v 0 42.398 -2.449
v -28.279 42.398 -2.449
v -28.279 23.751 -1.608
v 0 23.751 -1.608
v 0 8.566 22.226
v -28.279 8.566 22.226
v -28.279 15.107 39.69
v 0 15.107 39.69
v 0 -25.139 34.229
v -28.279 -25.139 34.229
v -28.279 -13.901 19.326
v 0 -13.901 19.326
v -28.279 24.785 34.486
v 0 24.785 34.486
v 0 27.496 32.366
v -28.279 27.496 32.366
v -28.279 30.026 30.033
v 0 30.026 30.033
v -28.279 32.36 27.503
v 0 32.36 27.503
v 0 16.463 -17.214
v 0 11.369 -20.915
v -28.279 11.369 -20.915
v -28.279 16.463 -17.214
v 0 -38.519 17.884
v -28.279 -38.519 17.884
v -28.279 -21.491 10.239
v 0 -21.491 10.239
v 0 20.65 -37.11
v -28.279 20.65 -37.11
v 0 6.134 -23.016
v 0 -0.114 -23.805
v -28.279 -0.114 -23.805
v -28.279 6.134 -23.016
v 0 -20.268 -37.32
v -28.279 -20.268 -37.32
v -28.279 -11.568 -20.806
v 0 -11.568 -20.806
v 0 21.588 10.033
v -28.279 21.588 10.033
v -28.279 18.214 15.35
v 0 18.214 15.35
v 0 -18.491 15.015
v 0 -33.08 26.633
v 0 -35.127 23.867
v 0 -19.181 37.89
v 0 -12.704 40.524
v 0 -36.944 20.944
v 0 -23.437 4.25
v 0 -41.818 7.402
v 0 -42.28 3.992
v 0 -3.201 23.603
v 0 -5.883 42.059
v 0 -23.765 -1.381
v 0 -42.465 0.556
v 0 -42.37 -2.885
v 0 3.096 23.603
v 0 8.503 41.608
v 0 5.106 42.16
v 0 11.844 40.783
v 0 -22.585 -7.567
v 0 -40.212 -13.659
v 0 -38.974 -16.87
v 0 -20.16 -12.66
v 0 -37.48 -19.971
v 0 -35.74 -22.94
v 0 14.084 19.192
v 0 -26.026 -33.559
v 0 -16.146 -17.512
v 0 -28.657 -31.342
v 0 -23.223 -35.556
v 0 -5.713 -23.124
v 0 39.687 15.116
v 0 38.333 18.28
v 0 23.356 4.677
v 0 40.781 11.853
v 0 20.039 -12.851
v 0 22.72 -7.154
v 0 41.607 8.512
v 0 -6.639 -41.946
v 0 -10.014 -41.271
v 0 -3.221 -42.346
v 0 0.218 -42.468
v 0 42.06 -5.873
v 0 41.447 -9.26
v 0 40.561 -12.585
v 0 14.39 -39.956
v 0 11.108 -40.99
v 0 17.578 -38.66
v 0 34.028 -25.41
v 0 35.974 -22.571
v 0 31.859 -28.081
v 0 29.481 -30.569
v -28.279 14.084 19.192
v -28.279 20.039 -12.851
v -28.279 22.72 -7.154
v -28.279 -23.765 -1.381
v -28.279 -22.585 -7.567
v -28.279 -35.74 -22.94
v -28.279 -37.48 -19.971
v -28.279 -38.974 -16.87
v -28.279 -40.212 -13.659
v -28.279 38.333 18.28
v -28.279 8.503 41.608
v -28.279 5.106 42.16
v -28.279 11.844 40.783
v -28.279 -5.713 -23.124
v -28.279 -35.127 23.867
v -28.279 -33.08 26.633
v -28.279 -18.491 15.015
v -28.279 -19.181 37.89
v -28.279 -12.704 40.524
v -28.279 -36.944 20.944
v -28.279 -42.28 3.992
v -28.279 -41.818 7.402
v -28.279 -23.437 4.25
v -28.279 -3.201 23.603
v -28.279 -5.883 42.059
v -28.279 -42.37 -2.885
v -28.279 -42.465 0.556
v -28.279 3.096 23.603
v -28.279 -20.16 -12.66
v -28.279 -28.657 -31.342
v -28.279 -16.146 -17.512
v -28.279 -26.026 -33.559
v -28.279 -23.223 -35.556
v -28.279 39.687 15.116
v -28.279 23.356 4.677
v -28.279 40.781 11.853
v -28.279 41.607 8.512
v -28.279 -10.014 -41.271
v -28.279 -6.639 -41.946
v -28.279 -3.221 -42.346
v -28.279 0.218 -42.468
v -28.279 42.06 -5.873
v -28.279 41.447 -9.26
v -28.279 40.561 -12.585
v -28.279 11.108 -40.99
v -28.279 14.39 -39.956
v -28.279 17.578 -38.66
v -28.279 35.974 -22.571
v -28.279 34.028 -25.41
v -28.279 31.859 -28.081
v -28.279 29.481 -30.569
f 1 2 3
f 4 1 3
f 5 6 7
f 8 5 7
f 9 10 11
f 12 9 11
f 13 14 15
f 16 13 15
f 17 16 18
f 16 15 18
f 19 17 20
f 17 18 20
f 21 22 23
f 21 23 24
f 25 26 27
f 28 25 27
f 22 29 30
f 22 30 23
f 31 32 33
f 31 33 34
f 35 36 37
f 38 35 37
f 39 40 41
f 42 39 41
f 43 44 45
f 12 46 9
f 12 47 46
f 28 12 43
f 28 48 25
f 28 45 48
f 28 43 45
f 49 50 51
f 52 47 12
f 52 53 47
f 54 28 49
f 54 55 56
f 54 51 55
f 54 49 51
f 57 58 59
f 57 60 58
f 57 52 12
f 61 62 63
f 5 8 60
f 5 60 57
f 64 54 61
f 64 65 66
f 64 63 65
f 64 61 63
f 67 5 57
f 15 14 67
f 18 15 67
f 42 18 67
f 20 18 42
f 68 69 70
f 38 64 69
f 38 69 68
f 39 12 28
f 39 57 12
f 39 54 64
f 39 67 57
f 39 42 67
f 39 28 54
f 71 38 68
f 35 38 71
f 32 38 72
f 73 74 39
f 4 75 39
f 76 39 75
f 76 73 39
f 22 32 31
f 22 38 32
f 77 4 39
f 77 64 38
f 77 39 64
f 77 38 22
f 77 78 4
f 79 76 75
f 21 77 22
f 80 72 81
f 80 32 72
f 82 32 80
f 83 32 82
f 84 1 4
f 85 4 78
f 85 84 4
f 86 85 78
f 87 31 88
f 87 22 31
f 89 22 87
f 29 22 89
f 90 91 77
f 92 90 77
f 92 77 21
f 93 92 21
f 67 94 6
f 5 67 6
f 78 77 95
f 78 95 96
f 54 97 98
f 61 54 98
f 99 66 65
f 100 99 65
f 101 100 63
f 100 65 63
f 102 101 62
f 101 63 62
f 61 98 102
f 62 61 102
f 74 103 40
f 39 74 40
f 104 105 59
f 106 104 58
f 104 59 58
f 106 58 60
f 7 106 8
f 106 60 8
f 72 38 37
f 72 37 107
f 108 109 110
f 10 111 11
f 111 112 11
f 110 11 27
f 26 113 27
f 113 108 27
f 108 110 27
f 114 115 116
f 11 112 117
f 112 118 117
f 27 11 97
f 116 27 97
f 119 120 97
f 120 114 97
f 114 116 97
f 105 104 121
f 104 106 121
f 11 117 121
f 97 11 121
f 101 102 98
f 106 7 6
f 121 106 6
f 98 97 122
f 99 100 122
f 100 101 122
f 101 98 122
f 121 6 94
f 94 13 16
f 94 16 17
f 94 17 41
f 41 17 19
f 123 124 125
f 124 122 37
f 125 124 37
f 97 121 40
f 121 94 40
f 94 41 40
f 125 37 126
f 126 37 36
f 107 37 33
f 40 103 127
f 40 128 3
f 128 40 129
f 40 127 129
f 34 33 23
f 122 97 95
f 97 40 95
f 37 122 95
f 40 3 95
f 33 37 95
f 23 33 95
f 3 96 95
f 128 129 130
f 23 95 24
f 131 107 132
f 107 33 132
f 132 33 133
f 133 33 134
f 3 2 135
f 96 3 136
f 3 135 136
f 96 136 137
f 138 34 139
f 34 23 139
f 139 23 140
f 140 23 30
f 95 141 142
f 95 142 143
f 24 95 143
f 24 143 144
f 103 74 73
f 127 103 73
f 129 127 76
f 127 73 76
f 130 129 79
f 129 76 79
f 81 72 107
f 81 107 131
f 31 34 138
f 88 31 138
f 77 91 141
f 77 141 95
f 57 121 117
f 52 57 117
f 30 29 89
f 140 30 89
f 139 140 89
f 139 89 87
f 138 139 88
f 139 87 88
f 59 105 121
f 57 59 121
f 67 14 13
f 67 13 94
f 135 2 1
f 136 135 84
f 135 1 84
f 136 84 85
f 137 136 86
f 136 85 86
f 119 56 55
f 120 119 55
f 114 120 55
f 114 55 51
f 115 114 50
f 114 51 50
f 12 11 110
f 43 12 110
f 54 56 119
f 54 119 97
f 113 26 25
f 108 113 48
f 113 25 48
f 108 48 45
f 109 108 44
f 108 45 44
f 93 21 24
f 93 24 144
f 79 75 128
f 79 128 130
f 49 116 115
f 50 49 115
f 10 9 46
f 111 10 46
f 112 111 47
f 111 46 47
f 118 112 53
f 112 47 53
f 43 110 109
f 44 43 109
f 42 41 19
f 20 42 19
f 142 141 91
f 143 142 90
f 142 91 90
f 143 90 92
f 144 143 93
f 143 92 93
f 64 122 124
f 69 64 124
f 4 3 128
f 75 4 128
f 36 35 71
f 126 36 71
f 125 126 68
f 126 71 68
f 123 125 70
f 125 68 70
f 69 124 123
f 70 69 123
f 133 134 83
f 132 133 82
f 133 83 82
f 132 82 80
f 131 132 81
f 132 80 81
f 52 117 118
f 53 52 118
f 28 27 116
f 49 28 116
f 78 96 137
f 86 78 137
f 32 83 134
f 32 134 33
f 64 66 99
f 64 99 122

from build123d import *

# Parameters (mm, degrees)
F0_W            = 28.2793976367
F0_H            = 42.4683615565
F3_DEPTH        = 50.8
F3_COPIES_COUNT = 12
F3_COPIES_ANGLE = 316.8


# Not quite as in the source:
# - a feature of the source that left no trace in its solid (it failed there, or was rolled back) is left out
# - a pattern or mirror of a feature is missing from the dataset's text; its kind, count and spacing are read off the source's solid


with BuildPart() as f1:
    # F0 (on Front) → F1 (revolve)
    with BuildSketch(Plane.XZ):
        with Locations((-14.1396988183, 21.2341807783)):
            Rectangle(F0_W, F0_H)
    revolve(axis=Axis((-14.1396988183, 0, 0), (-1, 0, 0)))

    # F2 (on face) → F3 (cut)
    with BuildSketch(Plane(origin=(-28.2793976367, 0, 0), x_dir=(0, -1, 0), z_dir=(-1, 0, 0))):
        with BuildLine():
            ThreePointArc((5.8825213519, 42.0589785401), (0.3916223416, 42.4665558438), (-5.1058594535, 42.1603122917))
            Line((-5.1058594535, 42.1603122917), (-3.0962699093, 23.6033536494))
            Line((-3.0962699093, 23.6033536494), (0, 23.6033536494))
            Line((0, 23.6033536494), (3.2008844428, 23.6033536494))
            Line((3.2008844428, 23.6033536494), (5.8825213519, 42.0589785401))
        make_face()
    f3 = extrude(amount=-F3_DEPTH, mode=Mode.SUBTRACT)

    # F3_copies: F3 ×12 about axis
    f3_copies_axis = Axis((0, 0, 0), (-1, 0, 0))
    for i in range(1, F3_COPIES_COUNT):
        add(f3.rotate(f3_copies_axis, i * F3_COPIES_ANGLE / (F3_COPIES_COUNT - 1)), mode=Mode.SUBTRACT)


solid = f1.part
